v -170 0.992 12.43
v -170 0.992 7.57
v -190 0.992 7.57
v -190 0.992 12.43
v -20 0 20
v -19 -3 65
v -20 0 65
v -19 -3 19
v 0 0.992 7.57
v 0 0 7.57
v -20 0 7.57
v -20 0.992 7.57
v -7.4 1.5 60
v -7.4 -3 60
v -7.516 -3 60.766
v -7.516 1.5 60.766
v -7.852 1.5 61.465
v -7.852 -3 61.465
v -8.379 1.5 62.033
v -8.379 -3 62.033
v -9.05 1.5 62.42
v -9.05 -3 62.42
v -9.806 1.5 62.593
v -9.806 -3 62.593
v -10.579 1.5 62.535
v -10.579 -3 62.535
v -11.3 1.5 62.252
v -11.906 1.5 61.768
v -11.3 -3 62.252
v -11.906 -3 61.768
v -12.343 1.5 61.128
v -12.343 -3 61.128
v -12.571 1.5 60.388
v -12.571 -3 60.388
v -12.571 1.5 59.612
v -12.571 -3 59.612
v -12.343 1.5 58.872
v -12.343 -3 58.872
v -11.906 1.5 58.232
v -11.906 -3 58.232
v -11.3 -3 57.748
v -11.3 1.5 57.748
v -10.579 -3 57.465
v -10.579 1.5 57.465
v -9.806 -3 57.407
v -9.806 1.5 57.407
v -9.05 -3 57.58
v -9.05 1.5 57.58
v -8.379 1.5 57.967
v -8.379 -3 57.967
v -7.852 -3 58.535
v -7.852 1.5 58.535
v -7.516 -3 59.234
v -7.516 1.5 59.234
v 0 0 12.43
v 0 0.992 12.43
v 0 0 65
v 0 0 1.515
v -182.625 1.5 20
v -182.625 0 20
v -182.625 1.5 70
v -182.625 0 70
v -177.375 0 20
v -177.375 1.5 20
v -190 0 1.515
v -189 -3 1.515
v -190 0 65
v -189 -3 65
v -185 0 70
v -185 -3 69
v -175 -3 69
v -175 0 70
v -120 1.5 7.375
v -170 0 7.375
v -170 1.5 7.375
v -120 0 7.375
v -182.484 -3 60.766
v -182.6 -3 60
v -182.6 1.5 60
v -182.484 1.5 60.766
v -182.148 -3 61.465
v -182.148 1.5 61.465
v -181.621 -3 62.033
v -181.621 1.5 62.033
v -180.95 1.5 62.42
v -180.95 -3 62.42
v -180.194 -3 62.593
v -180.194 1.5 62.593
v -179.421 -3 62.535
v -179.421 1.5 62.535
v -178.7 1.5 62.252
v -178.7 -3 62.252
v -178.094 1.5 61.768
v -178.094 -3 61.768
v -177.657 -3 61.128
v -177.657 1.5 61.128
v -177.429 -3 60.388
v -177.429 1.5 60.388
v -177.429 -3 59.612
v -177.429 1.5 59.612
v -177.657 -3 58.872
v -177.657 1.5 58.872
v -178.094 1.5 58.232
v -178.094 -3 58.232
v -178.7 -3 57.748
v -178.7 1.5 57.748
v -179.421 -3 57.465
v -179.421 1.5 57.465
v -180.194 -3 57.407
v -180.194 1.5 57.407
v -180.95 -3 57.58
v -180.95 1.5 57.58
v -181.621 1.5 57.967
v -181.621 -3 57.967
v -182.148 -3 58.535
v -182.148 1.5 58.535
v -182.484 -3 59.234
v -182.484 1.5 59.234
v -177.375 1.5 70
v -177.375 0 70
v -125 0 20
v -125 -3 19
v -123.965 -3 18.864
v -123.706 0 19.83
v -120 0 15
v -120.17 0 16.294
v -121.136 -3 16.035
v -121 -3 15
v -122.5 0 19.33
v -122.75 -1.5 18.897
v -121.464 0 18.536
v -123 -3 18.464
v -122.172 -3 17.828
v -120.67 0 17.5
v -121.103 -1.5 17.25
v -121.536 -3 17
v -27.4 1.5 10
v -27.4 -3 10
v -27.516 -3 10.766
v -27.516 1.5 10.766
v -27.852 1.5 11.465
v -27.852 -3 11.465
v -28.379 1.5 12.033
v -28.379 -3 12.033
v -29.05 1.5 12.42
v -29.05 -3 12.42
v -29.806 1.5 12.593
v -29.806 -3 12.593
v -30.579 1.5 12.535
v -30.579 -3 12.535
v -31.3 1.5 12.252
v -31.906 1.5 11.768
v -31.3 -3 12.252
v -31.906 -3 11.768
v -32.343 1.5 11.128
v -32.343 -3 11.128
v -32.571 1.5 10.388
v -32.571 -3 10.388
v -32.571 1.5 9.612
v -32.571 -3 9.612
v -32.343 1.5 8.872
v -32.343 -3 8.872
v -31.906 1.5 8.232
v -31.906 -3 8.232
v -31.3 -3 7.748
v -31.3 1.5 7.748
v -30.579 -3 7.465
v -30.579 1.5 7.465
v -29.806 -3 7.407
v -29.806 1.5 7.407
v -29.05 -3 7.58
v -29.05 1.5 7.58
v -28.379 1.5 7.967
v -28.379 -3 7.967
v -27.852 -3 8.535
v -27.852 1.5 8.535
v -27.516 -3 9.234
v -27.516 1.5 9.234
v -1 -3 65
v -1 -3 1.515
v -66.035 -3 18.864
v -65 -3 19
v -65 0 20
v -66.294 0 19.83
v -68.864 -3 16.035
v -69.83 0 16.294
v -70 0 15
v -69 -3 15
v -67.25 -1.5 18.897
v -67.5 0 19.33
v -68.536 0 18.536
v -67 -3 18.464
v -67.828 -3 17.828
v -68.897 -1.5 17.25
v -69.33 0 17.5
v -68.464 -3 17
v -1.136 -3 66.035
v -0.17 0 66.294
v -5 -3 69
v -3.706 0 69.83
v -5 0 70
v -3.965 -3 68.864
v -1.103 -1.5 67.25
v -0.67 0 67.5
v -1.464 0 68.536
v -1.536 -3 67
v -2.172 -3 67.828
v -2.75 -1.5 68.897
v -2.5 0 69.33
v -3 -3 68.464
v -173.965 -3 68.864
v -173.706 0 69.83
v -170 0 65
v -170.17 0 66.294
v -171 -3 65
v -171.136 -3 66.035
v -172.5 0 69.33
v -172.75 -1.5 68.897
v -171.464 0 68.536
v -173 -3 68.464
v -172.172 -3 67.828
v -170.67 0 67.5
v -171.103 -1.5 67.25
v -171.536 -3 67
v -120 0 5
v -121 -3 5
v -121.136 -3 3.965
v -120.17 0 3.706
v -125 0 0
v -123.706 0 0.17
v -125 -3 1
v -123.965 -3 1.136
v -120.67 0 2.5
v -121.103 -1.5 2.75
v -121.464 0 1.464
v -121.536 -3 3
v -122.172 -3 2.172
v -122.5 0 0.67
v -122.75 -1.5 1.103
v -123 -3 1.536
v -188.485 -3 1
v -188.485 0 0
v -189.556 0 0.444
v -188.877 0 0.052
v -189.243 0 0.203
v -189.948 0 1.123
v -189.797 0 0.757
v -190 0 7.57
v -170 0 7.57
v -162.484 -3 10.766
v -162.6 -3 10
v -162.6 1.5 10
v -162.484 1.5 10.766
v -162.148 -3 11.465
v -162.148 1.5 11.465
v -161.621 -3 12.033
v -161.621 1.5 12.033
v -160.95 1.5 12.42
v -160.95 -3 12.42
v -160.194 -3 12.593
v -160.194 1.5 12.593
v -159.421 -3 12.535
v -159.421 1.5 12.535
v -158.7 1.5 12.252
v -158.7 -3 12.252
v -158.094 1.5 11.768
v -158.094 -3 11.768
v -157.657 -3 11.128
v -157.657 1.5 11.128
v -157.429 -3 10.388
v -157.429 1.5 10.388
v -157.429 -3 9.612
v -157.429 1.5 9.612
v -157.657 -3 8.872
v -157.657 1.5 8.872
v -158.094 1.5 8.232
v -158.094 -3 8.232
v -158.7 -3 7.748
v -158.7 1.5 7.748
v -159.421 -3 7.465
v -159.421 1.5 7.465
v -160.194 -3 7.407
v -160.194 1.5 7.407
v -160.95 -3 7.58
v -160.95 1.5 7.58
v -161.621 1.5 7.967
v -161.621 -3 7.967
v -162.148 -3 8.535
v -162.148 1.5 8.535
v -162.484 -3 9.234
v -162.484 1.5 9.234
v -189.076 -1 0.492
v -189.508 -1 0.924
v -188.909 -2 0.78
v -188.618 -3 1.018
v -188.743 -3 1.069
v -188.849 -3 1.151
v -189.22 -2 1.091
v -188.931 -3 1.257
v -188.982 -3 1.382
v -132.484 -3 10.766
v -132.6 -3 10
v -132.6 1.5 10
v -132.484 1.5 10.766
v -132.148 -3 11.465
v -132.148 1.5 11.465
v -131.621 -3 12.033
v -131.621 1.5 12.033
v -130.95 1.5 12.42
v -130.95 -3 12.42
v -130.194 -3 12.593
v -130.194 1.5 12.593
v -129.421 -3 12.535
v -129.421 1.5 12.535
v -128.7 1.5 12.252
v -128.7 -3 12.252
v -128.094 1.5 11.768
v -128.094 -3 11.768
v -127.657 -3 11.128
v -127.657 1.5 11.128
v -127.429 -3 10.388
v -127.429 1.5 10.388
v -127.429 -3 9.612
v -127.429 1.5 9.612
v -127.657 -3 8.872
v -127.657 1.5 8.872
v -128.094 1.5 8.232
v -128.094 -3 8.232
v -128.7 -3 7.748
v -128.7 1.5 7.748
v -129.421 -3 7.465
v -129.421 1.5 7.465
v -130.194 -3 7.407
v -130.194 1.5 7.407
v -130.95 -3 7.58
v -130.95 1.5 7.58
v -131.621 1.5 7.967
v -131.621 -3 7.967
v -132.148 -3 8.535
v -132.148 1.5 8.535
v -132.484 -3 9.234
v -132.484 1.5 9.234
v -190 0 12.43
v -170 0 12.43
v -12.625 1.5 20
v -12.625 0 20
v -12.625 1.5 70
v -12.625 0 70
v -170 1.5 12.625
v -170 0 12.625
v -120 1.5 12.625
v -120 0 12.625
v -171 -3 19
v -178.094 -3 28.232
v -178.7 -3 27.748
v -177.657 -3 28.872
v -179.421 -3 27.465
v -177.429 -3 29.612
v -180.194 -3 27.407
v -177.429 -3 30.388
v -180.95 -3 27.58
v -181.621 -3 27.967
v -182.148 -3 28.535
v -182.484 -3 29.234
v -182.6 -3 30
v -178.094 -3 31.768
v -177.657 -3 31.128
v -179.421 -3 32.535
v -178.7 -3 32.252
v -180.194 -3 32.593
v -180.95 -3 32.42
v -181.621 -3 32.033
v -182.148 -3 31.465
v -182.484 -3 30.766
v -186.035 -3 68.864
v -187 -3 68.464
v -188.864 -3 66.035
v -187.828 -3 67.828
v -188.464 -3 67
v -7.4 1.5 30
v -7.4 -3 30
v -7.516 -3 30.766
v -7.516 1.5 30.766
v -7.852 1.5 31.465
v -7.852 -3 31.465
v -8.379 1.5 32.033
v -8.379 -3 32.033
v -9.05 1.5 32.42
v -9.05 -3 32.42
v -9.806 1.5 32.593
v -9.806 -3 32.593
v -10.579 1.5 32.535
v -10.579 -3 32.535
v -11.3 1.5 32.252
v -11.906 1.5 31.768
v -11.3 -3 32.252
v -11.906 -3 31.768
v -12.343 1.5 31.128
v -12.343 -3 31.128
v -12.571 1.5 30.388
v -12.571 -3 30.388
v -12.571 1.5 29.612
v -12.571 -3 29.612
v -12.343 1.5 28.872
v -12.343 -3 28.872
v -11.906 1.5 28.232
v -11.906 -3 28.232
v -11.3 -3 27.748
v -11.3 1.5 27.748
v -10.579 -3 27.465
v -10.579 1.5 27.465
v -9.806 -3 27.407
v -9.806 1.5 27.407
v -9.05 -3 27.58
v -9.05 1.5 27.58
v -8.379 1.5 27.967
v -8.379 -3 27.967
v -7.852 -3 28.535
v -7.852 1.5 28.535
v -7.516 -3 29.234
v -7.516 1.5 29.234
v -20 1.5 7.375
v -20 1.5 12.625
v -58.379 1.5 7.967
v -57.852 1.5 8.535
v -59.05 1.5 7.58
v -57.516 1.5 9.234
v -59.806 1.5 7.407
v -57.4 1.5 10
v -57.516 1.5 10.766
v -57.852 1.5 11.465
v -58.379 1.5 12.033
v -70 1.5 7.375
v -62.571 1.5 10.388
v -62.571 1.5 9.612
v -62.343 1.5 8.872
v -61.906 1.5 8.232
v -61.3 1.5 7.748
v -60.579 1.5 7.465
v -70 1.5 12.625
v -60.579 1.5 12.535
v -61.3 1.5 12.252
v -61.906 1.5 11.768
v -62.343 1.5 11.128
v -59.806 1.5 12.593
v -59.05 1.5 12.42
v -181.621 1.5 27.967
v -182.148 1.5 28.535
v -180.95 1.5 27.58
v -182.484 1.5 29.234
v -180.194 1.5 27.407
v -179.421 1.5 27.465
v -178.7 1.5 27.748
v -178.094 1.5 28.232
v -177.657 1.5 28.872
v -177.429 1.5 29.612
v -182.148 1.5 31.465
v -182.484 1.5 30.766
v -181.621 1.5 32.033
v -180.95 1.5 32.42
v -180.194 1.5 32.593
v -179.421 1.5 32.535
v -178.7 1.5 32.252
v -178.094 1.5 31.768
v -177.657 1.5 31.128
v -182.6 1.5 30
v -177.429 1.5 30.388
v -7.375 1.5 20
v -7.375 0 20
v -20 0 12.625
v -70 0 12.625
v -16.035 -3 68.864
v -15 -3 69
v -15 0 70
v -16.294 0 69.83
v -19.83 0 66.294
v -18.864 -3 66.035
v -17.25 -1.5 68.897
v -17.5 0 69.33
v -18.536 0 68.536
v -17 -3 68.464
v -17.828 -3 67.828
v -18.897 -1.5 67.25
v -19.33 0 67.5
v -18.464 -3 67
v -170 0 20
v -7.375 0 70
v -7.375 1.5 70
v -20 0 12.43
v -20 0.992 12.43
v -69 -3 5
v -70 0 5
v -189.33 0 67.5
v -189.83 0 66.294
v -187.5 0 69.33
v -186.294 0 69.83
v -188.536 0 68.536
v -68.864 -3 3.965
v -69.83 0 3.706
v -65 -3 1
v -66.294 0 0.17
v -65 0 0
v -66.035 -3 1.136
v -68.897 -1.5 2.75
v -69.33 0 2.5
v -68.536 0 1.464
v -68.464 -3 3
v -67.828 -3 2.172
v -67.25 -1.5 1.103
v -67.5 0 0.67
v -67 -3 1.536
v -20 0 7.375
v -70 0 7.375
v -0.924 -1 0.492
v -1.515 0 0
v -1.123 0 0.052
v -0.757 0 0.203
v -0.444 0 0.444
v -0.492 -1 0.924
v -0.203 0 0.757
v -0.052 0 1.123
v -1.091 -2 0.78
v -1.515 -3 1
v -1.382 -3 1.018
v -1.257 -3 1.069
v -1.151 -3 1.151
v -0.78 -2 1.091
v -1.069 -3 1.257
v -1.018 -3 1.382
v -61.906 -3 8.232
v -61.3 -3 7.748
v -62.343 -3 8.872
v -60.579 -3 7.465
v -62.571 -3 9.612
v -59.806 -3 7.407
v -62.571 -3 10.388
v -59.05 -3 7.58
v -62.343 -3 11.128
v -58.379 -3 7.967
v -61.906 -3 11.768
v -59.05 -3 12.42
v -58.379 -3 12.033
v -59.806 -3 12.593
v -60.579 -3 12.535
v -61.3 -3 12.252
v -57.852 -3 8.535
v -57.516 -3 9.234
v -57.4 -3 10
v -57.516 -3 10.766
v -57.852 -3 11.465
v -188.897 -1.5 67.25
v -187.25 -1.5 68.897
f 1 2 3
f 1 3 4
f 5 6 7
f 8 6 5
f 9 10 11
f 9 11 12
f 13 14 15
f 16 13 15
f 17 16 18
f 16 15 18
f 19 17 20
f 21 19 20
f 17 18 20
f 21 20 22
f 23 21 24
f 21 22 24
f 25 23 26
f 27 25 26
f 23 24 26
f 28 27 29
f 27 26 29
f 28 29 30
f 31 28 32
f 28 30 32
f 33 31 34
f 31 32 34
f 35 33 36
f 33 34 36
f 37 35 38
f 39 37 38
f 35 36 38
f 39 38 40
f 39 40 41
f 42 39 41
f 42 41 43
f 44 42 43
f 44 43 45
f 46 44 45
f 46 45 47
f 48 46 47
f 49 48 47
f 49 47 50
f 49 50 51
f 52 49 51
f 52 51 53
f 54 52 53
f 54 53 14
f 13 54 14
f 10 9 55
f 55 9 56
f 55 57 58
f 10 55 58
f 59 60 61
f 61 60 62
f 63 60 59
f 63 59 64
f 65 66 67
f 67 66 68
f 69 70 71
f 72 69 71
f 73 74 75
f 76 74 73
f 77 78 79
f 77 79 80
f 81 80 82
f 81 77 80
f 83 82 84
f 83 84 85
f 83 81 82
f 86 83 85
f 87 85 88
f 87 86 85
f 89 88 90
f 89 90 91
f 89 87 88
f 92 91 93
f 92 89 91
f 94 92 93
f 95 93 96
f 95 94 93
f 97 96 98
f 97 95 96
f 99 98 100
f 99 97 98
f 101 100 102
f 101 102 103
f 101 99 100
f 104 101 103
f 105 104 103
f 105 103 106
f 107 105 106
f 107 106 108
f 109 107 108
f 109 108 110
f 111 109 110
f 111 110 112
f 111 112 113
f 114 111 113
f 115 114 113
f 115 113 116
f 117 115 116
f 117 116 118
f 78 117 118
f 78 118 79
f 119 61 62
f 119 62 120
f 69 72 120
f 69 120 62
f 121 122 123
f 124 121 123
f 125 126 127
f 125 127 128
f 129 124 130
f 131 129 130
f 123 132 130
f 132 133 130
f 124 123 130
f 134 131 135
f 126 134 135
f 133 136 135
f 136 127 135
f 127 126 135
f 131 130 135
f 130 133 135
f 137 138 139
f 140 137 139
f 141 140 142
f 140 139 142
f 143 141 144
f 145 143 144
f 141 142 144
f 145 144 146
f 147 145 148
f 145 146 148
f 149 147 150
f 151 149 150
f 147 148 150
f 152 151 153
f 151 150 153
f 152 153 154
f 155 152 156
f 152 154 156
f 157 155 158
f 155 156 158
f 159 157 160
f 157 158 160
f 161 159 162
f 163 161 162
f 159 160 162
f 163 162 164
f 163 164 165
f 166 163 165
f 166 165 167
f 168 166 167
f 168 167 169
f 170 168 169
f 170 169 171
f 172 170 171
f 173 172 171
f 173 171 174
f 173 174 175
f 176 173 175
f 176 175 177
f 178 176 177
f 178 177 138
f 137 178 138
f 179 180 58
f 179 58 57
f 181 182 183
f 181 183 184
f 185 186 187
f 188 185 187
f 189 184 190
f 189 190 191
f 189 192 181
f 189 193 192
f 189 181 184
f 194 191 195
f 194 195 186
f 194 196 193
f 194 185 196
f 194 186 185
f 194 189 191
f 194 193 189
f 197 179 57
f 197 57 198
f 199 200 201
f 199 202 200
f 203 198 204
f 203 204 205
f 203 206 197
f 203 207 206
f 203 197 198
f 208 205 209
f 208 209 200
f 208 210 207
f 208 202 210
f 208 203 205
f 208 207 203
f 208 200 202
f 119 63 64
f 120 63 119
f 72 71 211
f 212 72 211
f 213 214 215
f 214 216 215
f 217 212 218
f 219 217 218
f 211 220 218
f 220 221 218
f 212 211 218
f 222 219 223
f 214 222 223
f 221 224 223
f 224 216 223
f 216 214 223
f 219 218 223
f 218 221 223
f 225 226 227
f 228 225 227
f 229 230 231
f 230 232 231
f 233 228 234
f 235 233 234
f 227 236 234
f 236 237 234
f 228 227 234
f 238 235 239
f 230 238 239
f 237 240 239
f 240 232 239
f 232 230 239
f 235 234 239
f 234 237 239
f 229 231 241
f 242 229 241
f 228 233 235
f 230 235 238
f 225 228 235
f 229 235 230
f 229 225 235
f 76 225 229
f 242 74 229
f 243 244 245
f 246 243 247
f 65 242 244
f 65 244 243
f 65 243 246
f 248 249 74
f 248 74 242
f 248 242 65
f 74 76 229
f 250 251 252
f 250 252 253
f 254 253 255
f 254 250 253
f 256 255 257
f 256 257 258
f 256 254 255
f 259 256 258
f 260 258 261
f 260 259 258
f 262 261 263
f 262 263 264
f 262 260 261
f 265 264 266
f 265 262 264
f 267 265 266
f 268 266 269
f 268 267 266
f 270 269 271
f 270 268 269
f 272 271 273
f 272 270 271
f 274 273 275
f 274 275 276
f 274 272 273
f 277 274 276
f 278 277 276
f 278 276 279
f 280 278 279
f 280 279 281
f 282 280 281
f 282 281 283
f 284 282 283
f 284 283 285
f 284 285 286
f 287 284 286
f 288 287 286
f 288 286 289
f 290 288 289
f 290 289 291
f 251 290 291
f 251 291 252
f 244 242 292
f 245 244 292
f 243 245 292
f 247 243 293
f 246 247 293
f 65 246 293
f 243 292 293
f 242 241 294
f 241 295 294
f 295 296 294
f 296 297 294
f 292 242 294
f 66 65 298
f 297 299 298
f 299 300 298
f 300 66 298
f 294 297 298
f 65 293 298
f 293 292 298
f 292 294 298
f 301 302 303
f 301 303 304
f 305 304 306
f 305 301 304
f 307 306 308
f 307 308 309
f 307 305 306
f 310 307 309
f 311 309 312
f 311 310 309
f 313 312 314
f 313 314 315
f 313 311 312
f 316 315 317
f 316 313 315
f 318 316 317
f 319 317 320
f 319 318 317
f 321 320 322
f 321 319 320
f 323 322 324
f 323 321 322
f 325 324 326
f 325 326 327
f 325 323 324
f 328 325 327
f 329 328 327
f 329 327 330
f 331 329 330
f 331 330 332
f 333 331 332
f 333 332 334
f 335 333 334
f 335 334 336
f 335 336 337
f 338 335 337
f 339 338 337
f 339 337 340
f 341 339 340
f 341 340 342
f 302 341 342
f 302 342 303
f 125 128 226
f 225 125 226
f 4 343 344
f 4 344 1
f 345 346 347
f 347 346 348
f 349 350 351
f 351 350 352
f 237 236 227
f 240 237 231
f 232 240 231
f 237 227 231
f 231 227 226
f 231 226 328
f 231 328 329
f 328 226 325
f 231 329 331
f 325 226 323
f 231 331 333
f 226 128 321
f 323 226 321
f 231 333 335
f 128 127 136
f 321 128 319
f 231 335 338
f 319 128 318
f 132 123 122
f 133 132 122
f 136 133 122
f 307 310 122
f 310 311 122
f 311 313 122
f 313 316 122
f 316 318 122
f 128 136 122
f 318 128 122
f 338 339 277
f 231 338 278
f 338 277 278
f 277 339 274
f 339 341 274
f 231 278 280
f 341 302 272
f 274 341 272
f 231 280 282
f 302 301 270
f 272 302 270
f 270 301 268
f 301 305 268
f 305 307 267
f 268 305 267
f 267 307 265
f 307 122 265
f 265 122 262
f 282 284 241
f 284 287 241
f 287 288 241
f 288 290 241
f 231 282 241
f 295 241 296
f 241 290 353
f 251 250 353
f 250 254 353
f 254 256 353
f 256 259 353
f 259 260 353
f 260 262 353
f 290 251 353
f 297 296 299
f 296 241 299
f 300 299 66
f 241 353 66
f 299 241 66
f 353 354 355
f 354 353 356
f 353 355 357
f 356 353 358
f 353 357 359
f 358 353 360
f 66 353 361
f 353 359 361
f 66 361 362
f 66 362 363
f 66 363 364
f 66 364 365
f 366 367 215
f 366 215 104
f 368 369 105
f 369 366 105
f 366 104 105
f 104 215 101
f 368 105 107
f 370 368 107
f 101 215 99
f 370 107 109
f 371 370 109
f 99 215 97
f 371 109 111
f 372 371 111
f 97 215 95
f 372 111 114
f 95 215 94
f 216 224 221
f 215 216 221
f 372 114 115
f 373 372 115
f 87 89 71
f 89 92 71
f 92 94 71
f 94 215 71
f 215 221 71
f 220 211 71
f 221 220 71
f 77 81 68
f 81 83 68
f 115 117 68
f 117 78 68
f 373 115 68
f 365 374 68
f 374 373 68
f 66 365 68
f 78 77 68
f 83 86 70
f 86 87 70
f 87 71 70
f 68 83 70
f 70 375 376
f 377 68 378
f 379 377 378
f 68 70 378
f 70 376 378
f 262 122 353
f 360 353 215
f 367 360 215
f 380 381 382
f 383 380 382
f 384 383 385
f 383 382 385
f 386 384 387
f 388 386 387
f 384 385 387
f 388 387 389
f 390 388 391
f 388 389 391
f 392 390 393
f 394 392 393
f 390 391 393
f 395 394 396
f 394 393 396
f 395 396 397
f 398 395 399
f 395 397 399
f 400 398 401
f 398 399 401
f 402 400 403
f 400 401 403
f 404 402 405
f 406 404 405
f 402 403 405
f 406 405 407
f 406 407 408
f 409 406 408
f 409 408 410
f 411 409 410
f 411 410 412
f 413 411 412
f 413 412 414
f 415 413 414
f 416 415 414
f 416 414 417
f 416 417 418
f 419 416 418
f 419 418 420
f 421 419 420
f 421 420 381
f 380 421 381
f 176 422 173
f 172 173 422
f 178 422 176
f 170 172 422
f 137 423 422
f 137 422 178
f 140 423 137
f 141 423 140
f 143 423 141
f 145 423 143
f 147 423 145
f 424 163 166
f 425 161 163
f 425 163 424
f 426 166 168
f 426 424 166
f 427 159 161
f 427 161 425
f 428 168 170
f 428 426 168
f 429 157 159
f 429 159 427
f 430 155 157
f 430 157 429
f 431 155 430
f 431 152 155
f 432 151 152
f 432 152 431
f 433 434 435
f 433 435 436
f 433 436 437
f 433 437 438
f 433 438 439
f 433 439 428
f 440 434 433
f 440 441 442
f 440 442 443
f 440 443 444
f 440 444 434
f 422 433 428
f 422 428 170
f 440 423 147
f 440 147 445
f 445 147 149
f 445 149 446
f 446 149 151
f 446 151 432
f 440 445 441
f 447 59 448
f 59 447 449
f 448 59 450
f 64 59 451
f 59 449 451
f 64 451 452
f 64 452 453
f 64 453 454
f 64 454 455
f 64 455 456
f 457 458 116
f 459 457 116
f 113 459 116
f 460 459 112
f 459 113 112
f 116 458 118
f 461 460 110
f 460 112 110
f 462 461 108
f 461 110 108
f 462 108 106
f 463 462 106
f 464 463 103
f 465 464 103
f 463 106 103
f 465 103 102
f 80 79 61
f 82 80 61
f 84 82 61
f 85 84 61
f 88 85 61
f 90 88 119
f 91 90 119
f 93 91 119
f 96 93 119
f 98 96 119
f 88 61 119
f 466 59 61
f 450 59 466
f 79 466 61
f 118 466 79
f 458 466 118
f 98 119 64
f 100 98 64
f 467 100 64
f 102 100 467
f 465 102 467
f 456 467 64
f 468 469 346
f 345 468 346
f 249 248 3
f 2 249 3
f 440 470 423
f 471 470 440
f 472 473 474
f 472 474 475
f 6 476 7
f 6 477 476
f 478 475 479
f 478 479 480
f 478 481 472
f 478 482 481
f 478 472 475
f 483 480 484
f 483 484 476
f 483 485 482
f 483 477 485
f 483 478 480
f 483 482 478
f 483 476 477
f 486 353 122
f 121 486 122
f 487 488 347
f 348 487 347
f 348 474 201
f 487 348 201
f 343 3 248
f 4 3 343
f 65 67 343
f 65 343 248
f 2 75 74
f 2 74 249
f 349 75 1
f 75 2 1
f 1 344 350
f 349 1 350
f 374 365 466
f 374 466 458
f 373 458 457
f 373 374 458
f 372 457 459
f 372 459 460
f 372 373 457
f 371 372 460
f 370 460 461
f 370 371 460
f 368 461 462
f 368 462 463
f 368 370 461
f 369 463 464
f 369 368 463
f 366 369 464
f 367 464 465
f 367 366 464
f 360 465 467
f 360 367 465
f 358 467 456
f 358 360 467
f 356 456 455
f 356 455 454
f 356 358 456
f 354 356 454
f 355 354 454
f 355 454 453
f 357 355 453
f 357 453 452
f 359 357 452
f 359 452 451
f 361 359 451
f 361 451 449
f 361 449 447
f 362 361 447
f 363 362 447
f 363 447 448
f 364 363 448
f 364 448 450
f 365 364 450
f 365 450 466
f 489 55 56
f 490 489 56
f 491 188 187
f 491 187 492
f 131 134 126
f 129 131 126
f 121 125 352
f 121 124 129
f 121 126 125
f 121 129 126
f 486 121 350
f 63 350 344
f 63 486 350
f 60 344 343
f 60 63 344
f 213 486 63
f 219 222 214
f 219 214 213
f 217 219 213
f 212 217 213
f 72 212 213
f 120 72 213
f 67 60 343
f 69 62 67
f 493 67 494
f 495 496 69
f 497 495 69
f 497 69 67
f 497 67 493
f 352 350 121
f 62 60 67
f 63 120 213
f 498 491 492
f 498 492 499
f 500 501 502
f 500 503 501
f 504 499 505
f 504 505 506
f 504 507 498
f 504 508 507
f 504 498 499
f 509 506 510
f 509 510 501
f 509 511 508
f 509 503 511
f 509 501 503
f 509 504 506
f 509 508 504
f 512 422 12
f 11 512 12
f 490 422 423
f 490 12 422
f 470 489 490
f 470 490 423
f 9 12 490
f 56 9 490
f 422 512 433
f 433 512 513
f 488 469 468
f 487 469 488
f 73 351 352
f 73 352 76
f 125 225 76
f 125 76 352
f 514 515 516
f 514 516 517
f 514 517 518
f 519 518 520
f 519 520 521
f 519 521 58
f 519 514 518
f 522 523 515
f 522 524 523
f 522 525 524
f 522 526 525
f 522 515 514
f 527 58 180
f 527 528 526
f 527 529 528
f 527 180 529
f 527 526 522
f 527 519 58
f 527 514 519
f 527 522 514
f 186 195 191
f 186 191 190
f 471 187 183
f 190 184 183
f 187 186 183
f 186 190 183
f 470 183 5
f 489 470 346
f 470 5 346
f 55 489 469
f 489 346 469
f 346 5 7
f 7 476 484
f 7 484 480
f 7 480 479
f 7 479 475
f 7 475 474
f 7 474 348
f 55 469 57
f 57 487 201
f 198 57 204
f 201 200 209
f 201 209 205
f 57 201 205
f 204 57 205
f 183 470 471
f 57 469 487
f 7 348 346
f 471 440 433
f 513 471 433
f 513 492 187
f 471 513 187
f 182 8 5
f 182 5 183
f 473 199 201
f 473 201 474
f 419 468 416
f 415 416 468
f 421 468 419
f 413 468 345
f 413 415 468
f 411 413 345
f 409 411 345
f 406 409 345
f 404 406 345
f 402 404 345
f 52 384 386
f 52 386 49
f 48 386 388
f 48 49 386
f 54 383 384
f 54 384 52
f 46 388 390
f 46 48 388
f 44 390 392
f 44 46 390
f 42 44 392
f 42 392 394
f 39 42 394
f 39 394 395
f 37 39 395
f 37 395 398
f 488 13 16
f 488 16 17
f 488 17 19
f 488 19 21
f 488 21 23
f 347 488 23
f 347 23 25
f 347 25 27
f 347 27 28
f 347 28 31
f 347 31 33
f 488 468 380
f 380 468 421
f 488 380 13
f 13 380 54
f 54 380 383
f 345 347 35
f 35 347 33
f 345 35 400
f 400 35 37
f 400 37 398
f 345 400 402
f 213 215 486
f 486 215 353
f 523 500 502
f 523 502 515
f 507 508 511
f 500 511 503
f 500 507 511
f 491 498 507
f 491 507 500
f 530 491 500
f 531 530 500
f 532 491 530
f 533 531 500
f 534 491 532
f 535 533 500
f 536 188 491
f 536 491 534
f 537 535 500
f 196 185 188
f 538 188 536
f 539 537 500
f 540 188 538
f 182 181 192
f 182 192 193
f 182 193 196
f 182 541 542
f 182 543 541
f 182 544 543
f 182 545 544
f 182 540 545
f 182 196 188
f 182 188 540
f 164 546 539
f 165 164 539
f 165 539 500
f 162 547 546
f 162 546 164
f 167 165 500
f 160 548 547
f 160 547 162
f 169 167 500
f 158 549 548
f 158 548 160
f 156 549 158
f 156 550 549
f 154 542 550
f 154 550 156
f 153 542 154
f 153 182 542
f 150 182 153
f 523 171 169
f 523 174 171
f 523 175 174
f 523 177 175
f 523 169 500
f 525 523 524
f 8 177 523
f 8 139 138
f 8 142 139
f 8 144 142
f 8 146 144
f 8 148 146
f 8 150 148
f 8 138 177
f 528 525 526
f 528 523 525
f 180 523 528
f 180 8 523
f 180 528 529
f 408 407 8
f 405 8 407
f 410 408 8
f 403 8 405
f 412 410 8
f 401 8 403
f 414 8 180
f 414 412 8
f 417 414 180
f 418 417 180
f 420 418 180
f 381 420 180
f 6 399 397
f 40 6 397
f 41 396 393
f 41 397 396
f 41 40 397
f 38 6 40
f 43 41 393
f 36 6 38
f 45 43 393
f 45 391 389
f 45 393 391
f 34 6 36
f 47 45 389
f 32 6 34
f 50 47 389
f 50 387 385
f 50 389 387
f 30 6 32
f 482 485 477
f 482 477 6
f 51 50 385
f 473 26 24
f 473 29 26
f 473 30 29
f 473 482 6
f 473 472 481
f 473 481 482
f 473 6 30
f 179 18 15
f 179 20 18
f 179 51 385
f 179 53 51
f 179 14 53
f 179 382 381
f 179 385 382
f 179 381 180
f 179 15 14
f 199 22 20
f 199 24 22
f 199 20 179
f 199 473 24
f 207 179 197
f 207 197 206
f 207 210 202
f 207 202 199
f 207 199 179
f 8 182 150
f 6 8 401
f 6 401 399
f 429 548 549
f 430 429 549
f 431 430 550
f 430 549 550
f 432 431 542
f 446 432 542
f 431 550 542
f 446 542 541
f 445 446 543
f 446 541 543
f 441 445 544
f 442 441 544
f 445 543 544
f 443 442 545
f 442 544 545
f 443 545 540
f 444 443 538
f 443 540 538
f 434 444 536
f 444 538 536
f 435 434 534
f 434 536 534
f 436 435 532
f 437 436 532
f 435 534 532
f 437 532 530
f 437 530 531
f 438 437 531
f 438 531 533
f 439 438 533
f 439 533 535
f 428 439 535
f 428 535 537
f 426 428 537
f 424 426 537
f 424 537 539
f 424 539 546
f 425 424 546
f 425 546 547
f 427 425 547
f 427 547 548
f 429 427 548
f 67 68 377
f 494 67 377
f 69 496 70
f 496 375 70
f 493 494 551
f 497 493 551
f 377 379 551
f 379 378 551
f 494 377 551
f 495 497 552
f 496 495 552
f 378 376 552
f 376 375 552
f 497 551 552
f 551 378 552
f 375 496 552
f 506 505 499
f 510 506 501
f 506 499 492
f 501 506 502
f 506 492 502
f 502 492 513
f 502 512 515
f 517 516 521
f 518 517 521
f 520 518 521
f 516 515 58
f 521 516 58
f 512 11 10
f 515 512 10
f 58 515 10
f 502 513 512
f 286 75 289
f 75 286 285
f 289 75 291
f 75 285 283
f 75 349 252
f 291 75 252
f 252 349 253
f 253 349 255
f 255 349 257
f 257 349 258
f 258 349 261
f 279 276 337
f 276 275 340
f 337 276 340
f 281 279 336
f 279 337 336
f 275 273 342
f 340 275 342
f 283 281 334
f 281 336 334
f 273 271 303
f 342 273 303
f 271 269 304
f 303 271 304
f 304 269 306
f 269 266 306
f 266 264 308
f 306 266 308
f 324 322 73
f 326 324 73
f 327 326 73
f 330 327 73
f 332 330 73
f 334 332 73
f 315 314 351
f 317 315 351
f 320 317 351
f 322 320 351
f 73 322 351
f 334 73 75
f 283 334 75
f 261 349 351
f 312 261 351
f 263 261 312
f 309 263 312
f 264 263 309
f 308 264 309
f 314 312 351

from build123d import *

# Parameters (mm, degrees)
F1_DEPTH = 3
F2_W     = 0.992
F2_H     = 4.86
F3_DEPTH = 20
F4_W     = 5.25
F4_H     = 50
F4_W_2   = 50
F4_H_2   = 5.25
F5_DEPTH = 1.5
F6_R     = 2.6
F7_DEPTH = 4.501
F9_SIZE2 = 0.99999
F9_SIZE  = 2.99999


# Not quite as in the source:
# - a fillet or chamfer is up to 0.001 mm smaller than in the source, because OpenCascade refuses the exact size


with BuildPart() as f1:
    # F0 (on Front) → F1 (new body)
    with BuildSketch(Plane.XZ):
        with BuildLine():
            ThreePointArc((-1.515, 0), (-0.4437332265, 0.4437332265), (0, 1.515))
            Line((0, 1.515), (0, 65))
            ThreePointArc((0, 65), (-1.4644660941, 68.5355339059), (-5, 70))
            Line((-5, 70), (-15, 70))
            ThreePointArc((-15, 70), (-18.5355339059, 68.5355339059), (-20, 65))
            Line((-20, 65), (-20, 20))
            Line((-20, 20), (-65, 20))
            ThreePointArc((-65, 20), (-68.5355339059, 18.5355339059), (-70, 15))
            Line((-70, 15), (-70, 5))
            ThreePointArc((-70, 5), (-68.5355339059, 1.4644660941), (-65, 0))
            Line((-65, 0), (-1.515, 0))
        make_face()
    extrude(amount=F1_DEPTH)

    # F2 (on face) → F3 (join)
    with BuildSketch(Plane.YZ):
        with Locations((0.496, 10)):
            Rectangle(F2_W, F2_H)
    extrude(amount=-F3_DEPTH)

    # F4 (on face) → F5 (join)
    with BuildSketch(Plane(origin=(0, 0, 0), x_dir=(-1, 0, 0), z_dir=(0, 1, 0))):
        with Locations((10, 45)):
            Rectangle(F4_W, F4_H)
        with Locations((45, 10)):
            Rectangle(F4_W_2, F4_H_2)
    extrude(amount=F5_DEPTH)

    # F6 (on face) → F7 (cut, through all)
    with BuildSketch(Plane.XZ.offset(3)):
        with Locations((-10, 60)):
            Circle(F6_R)
        with Locations((-10, 30)):
            Circle(F6_R)
        with Locations((-30, 10)):
            Circle(F6_R)
        with Locations((-60, 10)):
            Circle(F6_R)
    extrude(amount=-F7_DEPTH, mode=Mode.SUBTRACT)

    # F9 (size 3 and 1 in the source; OpenCascade refuses exactly that, so slightly less here)
    f9_edges = [f1.edges().sort_by_distance(p)[0] for p in [
        (-42.5, -3, 20),
    ]]
    f9_side = f1.faces().sort_by_distance((-42.5, -1.5, 20))[0]
    chamfer(f9_edges, length=F9_SIZE, length2=F9_SIZE2, reference=f9_side)


with BuildPart() as f10_1:
    # F10: instance of F1
    add(f1.part.mirror(Plane(origin=(-95, -1.0321782178, 10), x_dir=(0, -1, 0), z_dir=(-1, 0, 0))))


solid = Compound([f1.part, f10_1.part])
